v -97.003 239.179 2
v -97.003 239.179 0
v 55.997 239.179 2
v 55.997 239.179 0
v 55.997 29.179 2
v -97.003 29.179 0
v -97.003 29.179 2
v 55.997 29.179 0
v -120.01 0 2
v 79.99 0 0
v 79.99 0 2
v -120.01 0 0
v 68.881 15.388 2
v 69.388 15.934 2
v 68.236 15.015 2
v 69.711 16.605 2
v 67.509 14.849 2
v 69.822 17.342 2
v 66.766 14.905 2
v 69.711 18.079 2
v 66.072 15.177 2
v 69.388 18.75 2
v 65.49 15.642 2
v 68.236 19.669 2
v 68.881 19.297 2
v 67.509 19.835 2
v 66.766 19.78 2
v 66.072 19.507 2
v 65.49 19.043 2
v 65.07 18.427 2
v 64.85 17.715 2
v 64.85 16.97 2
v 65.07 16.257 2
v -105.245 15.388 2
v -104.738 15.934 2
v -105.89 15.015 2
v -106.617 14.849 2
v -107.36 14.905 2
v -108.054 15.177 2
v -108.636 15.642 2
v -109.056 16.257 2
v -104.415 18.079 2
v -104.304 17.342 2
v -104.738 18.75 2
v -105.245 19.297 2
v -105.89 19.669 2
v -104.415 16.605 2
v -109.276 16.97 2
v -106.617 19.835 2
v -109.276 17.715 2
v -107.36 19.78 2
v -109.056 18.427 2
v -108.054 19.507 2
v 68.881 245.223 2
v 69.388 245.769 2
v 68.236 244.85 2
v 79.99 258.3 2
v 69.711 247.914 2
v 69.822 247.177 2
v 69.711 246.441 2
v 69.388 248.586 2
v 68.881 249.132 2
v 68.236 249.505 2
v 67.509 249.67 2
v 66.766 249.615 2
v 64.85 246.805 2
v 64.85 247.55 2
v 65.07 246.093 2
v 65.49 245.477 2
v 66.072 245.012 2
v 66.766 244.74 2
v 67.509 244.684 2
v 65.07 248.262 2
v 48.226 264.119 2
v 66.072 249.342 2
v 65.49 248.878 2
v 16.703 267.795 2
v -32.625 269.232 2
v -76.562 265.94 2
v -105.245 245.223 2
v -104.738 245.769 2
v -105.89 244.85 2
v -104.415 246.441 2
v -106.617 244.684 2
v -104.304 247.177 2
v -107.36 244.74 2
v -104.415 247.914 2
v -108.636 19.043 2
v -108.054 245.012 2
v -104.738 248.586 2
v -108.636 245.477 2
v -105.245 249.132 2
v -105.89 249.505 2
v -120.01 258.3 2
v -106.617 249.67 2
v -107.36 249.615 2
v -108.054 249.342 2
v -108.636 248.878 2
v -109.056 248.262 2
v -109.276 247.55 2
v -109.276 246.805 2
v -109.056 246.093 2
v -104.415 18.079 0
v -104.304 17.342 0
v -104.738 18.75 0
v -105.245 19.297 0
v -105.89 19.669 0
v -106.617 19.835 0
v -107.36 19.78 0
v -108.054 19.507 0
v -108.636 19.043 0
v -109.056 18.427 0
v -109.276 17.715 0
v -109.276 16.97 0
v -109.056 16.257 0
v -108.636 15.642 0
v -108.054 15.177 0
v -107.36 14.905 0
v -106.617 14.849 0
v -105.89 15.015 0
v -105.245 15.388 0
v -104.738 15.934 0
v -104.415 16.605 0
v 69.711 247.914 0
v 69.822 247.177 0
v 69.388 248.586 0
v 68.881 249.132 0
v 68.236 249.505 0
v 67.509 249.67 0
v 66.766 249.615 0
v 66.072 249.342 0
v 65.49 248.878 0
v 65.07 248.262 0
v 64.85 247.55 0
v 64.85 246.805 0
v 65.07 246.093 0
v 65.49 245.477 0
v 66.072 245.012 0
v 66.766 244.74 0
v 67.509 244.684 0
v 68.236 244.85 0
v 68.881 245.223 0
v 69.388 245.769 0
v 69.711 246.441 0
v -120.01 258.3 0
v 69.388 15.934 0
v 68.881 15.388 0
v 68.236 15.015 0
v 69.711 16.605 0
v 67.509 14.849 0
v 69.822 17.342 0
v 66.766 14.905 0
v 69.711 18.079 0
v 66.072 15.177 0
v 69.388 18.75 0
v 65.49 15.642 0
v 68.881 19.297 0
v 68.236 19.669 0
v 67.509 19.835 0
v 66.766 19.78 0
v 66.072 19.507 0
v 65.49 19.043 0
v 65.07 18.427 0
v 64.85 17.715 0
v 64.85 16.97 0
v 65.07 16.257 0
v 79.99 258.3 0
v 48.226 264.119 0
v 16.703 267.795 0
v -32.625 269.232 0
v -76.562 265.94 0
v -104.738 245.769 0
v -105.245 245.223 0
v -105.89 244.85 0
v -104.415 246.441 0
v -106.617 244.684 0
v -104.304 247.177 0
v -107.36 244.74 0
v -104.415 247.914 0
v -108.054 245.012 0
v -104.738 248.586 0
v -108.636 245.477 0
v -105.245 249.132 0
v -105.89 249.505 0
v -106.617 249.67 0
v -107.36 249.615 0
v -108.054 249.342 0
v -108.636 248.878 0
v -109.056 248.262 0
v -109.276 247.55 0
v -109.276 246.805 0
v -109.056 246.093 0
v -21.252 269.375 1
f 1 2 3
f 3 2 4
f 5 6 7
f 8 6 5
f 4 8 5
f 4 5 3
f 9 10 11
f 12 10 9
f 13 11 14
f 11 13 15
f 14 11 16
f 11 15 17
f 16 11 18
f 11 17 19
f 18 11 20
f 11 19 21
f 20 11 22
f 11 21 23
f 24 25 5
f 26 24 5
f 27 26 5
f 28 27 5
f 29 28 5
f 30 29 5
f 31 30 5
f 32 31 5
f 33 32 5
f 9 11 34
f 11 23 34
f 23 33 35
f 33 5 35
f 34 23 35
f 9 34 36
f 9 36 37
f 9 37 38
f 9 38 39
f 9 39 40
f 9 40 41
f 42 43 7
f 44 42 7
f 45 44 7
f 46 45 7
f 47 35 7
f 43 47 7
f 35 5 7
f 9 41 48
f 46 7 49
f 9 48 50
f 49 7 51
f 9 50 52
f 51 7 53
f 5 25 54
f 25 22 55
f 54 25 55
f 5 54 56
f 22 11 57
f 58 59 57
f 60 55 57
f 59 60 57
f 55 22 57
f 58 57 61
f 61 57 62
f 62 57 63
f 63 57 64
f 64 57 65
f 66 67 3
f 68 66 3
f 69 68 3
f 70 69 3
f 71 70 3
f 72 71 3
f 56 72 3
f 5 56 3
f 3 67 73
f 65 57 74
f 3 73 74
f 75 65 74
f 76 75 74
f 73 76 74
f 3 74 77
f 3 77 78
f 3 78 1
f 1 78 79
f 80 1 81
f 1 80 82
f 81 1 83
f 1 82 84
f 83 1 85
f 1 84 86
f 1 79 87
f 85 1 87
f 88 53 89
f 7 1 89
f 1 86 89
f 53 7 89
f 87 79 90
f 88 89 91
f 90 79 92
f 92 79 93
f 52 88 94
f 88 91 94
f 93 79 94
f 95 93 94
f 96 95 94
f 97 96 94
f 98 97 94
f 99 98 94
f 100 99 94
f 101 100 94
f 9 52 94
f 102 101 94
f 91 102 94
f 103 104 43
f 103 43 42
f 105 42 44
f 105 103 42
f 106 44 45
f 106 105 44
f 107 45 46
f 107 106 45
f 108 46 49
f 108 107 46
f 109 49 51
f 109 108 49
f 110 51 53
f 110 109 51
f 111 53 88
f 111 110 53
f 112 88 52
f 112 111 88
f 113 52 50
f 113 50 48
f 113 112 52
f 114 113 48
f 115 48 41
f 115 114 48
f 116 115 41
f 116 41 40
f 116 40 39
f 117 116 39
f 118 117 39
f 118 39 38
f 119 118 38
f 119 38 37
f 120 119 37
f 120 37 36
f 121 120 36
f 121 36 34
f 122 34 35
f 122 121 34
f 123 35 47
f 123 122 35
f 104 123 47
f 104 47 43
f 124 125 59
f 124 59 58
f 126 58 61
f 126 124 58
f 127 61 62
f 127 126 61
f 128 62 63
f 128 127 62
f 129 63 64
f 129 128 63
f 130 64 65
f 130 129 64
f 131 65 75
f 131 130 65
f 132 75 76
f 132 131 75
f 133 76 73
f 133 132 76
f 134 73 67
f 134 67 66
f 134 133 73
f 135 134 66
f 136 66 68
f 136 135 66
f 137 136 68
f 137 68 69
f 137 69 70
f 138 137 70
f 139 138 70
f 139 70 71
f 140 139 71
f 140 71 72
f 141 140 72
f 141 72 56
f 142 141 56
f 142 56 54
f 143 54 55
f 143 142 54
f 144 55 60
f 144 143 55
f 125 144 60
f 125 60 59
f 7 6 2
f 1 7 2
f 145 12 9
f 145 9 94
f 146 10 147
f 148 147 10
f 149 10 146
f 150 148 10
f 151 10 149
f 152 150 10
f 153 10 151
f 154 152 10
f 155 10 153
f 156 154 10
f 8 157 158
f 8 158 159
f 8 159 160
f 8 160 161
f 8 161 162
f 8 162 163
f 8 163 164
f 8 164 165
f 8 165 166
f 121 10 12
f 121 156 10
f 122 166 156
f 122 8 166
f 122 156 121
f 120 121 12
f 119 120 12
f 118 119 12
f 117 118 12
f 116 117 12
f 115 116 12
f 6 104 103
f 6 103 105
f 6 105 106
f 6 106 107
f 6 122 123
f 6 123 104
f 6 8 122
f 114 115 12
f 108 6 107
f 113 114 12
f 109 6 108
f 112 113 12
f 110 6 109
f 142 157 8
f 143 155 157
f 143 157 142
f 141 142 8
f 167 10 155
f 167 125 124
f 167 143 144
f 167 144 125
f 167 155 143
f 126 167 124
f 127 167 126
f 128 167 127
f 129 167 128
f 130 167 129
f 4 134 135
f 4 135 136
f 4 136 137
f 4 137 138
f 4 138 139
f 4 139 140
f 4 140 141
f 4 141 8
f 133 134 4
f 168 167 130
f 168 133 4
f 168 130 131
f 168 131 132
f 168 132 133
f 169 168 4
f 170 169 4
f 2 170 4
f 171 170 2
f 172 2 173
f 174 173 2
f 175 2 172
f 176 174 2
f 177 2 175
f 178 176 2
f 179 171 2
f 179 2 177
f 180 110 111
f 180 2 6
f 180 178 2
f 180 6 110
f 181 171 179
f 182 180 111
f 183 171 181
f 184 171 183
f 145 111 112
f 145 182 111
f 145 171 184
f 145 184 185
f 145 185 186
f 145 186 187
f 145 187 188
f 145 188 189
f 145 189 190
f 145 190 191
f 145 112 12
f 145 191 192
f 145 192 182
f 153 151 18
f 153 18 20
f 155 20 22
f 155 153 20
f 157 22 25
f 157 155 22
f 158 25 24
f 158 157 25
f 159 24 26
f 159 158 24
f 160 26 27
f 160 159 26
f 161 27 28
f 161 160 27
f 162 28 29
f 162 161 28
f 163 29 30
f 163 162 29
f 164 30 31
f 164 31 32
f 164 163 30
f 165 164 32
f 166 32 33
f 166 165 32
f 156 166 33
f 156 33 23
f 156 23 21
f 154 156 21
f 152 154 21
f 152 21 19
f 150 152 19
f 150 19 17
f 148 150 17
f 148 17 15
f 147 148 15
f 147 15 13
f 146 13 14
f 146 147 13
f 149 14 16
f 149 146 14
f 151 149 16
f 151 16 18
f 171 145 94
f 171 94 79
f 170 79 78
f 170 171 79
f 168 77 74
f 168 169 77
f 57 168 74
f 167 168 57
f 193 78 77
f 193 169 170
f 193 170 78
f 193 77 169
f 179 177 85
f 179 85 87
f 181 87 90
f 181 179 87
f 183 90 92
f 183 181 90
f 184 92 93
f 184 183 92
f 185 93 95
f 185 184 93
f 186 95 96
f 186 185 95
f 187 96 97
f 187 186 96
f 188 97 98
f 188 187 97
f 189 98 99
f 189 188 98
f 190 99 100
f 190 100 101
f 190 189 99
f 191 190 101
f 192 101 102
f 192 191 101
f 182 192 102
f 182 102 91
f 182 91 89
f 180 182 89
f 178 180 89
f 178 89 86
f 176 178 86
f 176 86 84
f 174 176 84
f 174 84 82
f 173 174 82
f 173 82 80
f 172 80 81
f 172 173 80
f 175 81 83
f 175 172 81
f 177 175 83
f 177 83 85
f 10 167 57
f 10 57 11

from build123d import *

# Parameters (mm, degrees)
SKETCH1_R           = 2.5
SKETCH1_W           = 153
SKETCH1_H           = 210
BOSS_EXTRUDE1_DEPTH = 2


with BuildPart() as part:
    # Sketch1 → Boss-Extrude1 (new body)
    with BuildSketch(Plane.XY):
        with BuildLine():
            Line((79.989677419, 0), (-120.010322581, 0))
            Line((-120.010322581, 0), (-120.010322581, 258.3))
            add(Edge.make_bspline(
                [(-120.010322581, 258.3), (-22.49451042, 280.450990468), (79.989677419, 258.3)],
                knots=[0, 0, 0, 1, 1, 1], degree=2))
            Line((79.989677419, 258.3), (79.989677419, 0))
        make_face()
        with Locations((-106.803669914, 247.177426871)):
            Circle(SKETCH1_R, mode=Mode.SUBTRACT)
        with Locations((67.322454172, 247.177426871)):
            Circle(SKETCH1_R, mode=Mode.SUBTRACT)
        with Locations((67.322454172, 17.342199543)):
            Circle(SKETCH1_R, mode=Mode.SUBTRACT)
        with Locations((-106.803669914, 17.342199543)):
            Circle(SKETCH1_R, mode=Mode.SUBTRACT)
        with Locations((-20.502905322, 134.178843816)):
            Rectangle(SKETCH1_W, SKETCH1_H, mode=Mode.SUBTRACT)
    extrude(amount=BOSS_EXTRUDE1_DEPTH)


solid = part.part
